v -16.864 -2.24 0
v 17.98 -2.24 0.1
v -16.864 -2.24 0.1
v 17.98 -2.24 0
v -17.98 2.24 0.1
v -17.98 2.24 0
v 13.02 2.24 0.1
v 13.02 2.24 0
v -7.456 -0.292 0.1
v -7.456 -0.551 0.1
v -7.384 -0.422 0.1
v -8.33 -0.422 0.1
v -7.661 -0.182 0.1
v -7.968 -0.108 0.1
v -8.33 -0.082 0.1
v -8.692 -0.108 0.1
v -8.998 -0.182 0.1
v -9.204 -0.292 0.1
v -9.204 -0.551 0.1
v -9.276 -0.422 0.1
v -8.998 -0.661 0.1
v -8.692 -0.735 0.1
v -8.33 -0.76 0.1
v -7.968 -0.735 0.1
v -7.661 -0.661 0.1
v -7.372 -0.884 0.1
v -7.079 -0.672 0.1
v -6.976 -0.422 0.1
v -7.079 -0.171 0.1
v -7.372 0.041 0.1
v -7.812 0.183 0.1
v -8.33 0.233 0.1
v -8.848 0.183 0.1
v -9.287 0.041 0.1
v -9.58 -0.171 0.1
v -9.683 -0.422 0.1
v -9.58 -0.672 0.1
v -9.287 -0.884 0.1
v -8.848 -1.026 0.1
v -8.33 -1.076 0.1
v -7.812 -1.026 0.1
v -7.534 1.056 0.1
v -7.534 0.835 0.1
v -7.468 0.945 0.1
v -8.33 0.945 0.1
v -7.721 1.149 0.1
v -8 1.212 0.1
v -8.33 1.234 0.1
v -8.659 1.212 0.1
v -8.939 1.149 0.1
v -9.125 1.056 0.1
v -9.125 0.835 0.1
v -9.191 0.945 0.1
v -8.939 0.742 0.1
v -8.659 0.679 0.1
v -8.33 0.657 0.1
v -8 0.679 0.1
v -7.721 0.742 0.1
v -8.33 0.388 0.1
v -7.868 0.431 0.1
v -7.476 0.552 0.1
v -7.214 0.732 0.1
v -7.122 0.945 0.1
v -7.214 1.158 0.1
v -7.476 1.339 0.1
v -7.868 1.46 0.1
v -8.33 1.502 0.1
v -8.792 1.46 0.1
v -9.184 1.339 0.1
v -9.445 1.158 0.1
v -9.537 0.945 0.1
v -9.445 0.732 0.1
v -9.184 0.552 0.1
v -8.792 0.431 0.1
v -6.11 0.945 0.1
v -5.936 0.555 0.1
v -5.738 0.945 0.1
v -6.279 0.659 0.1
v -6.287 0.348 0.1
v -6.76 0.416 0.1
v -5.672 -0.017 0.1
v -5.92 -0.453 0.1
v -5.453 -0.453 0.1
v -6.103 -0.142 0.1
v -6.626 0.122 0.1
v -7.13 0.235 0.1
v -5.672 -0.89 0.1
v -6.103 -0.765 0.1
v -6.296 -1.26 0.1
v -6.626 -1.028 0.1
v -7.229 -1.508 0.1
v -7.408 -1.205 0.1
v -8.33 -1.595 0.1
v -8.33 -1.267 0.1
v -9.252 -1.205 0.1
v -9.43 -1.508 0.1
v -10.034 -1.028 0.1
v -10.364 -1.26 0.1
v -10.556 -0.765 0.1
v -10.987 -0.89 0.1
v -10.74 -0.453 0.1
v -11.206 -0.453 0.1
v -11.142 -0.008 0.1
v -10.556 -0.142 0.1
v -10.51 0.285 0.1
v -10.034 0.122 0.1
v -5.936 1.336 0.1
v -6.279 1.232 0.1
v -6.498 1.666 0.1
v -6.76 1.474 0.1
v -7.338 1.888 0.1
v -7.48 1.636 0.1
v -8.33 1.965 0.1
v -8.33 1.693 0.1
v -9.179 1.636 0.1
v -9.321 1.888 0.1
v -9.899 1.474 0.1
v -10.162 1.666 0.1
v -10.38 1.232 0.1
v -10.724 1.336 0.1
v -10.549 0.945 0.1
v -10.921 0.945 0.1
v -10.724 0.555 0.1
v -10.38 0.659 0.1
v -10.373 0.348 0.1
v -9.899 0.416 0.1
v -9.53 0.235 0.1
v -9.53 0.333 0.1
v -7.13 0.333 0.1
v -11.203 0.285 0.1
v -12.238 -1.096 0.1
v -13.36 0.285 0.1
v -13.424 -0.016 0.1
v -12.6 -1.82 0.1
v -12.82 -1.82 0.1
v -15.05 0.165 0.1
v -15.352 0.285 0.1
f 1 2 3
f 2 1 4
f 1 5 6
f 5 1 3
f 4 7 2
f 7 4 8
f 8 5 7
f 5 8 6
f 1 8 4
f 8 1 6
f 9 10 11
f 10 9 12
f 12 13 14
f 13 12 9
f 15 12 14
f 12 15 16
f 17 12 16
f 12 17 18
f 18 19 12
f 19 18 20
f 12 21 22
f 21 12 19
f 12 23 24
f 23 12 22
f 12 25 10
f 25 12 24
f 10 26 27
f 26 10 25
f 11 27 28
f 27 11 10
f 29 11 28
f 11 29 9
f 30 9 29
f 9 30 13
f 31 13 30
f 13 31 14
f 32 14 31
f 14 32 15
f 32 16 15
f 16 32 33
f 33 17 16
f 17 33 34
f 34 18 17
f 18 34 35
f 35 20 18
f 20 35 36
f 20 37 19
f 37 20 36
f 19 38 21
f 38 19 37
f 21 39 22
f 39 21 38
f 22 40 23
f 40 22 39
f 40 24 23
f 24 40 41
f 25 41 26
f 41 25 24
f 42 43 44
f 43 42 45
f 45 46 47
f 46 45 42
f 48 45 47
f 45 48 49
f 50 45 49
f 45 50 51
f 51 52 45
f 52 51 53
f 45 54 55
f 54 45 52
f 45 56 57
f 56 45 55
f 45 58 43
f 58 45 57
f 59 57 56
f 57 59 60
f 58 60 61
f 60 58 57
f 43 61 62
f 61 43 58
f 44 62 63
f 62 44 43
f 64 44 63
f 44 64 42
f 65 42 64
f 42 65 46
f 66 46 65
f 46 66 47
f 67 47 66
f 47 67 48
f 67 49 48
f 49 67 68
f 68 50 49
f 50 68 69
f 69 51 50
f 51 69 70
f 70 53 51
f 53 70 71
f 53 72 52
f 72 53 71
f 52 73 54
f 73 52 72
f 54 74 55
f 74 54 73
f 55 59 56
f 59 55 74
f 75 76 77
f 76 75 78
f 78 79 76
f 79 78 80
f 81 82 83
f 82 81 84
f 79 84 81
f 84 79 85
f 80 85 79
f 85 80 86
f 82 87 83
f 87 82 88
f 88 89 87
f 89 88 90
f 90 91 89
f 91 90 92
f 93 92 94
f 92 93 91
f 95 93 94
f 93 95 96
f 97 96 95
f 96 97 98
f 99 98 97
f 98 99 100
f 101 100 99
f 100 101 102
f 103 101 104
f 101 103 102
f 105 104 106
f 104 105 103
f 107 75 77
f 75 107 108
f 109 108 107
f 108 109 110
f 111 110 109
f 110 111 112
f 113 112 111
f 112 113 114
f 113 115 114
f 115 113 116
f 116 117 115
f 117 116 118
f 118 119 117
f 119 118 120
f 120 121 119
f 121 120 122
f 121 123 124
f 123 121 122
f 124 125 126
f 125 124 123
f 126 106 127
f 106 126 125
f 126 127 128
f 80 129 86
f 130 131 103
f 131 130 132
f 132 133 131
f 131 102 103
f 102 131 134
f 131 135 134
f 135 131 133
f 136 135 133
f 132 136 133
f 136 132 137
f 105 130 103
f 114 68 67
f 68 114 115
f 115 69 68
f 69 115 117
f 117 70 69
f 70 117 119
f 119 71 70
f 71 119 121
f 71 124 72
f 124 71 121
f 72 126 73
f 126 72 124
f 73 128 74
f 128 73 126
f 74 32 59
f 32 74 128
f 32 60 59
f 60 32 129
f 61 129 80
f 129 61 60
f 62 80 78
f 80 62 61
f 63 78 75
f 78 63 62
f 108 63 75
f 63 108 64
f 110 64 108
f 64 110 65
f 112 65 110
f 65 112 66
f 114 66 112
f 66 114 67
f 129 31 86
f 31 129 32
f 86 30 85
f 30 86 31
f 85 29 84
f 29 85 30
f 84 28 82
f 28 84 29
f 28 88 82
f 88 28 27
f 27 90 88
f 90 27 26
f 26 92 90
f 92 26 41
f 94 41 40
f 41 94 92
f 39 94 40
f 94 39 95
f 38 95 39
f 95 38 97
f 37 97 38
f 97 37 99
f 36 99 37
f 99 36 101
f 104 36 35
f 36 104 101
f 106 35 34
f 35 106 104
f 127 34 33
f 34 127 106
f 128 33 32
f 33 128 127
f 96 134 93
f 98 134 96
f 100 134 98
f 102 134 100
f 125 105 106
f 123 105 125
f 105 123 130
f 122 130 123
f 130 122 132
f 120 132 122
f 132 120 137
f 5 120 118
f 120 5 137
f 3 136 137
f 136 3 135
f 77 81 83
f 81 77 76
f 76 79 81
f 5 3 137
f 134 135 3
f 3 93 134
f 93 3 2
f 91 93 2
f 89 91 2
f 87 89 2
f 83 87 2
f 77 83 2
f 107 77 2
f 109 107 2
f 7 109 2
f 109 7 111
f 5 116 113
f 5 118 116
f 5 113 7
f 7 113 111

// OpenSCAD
use <../lib.scad>
function ldraw_lib__4125165f() = [
// 0 Sticker  0.6 x  4.5 Trapezoid with White "v8" on Left Side on Red Background
// 0 Name: 4125165f.dat
// 0 Author: Max Martin Richter [MMR1988]
// 0 !LDRAW_ORG Part UPDATE 2019-03
// 0 !LICENSE Licensed under CC BY 2.0 and CC BY 4.0 : see CAreadme.txt
// 
// 0 BFC CERTIFY CCW
  [0,"BFC","CERTIFY"],
  [0,"BFC","CCW"],
// 
// 0 !KEYWORDS Set 8448
// 
// 0 !HISTORY 2019-12-27 [PTadmin] Official Update 2019-03
// 
// 
// 4 16 44.95 0 -5.6 44.95 -0.25 -5.6 -42.16 -0.25 -5.6 -42.16 0 -5.6
  [4,16,44.95,0,-5.6,44.95,-0.25,-5.6,-42.16,-0.25,-5.6,-42.16,0,-5.6],
// 4 16 -44.95 0 5.6 -42.16 0 -5.6 -42.16 -0.25 -5.6 -44.95 -0.25 5.6
  [4,16,-44.95,0,5.6,-42.16,0,-5.6,-42.16,-0.25,-5.6,-44.95,-0.25,5.6],
// 4 16 44.95 0 -5.6 32.55 0 5.6 32.55 -0.25 5.6 44.95 -0.25 -5.6
  [4,16,44.95,0,-5.6,32.55,0,5.6,32.55,-0.25,5.6,44.95,-0.25,-5.6],
// 4 16 32.55 -0.25 5.6 32.55 0 5.6 -44.95 0 5.6 -44.95 -0.25 5.6
  [4,16,32.55,-0.25,5.6,32.55,0,5.6,-44.95,0,5.6,-44.95,-0.25,5.6],
// 4 16 -42.16 0 -5.6 -44.95 0 5.6 32.55 0 5.6 44.95 0 -5.6
  [4,16,-42.16,0,-5.6,-44.95,0,5.6,32.55,0,5.6,44.95,0,-5.6],
// 
// 4 4 -20.824 -0.25 -1.054 -18.64 -0.25 -1.378 -18.46 -0.25 -1.054 -18.64 -0.25 -0.729
  [4,4,-20.824,-0.25,-1.054,-18.64,-0.25,-1.378,-18.46,-0.25,-1.054,-18.64,-0.25,-0.729],
// 4 4 -20.824 -0.25 -1.054 -18.64 -0.25 -0.729 -19.152 -0.25 -0.454 -19.919 -0.25 -0.271
  [4,4,-20.824,-0.25,-1.054,-18.64,-0.25,-0.729,-19.152,-0.25,-0.454,-19.919,-0.25,-0.271],
// 4 4 -20.824 -0.25 -1.054 -19.919 -0.25 -0.271 -20.824 -0.25 -0.206 -21.729 -0.25 -0.271
  [4,4,-20.824,-0.25,-1.054,-19.919,-0.25,-0.271,-20.824,-0.25,-0.206,-21.729,-0.25,-0.271],
// 4 4 -20.824 -0.25 -1.054 -21.729 -0.25 -0.271 -22.496 -0.25 -0.454 -23.009 -0.25 -0.729
  [4,4,-20.824,-0.25,-1.054,-21.729,-0.25,-0.271,-22.496,-0.25,-0.454,-23.009,-0.25,-0.729],
// 4 4 -20.824 -0.25 -1.054 -23.009 -0.25 -0.729 -23.189 -0.25 -1.054 -23.009 -0.25 -1.378
  [4,4,-20.824,-0.25,-1.054,-23.009,-0.25,-0.729,-23.189,-0.25,-1.054,-23.009,-0.25,-1.378],
// 4 4 -20.824 -0.25 -1.054 -23.009 -0.25 -1.378 -22.496 -0.25 -1.653 -21.729 -0.25 -1.837
  [4,4,-20.824,-0.25,-1.054,-23.009,-0.25,-1.378,-22.496,-0.25,-1.653,-21.729,-0.25,-1.837],
// 4 4 -20.824 -0.25 -1.054 -21.729 -0.25 -1.837 -20.824 -0.25 -1.901 -19.919 -0.25 -1.837
  [4,4,-20.824,-0.25,-1.054,-21.729,-0.25,-1.837,-20.824,-0.25,-1.901,-19.919,-0.25,-1.837],
// 4 4 -20.824 -0.25 -1.054 -19.919 -0.25 -1.837 -19.152 -0.25 -1.653 -18.64 -0.25 -1.378
  [4,4,-20.824,-0.25,-1.054,-19.919,-0.25,-1.837,-19.152,-0.25,-1.653,-18.64,-0.25,-1.378],
// 4 15 -19.152 -0.25 -1.653 -18.431 -0.25 -2.21 -17.698 -0.25 -1.68 -18.64 -0.25 -1.378
  [4,15,-19.152,-0.25,-1.653,-18.431,-0.25,-2.21,-17.698,-0.25,-1.68,-18.64,-0.25,-1.378],
// 4 15 -18.64 -0.25 -1.378 -17.698 -0.25 -1.68 -17.44 -0.25 -1.054 -18.46 -0.25 -1.054
  [4,15,-18.64,-0.25,-1.378,-17.698,-0.25,-1.68,-17.44,-0.25,-1.054,-18.46,-0.25,-1.054],
// 4 15 -18.46 -0.25 -1.054 -17.44 -0.25 -1.054 -17.698 -0.25 -0.428 -18.64 -0.25 -0.729
  [4,15,-18.46,-0.25,-1.054,-17.44,-0.25,-1.054,-17.698,-0.25,-0.428,-18.64,-0.25,-0.729],
// 4 15 -18.64 -0.25 -0.729 -17.698 -0.25 -0.428 -18.431 -0.25 0.103 -19.152 -0.25 -0.454
  [4,15,-18.64,-0.25,-0.729,-17.698,-0.25,-0.428,-18.431,-0.25,0.103,-19.152,-0.25,-0.454],
// 4 15 -19.152 -0.25 -0.454 -18.431 -0.25 0.103 -19.529 -0.25 0.458 -19.919 -0.25 -0.271
  [4,15,-19.152,-0.25,-0.454,-18.431,-0.25,0.103,-19.529,-0.25,0.458,-19.919,-0.25,-0.271],
// 4 15 -19.919 -0.25 -0.271 -19.529 -0.25 0.458 -20.824 -0.25 0.582 -20.824 -0.25 -0.206
  [4,15,-19.919,-0.25,-0.271,-19.529,-0.25,0.458,-20.824,-0.25,0.582,-20.824,-0.25,-0.206],
// 4 15 -20.824 -0.25 -0.206 -20.824 -0.25 0.582 -22.119 -0.25 0.458 -21.729 -0.25 -0.271
  [4,15,-20.824,-0.25,-0.206,-20.824,-0.25,0.582,-22.119,-0.25,0.458,-21.729,-0.25,-0.271],
// 4 15 -21.729 -0.25 -0.271 -22.119 -0.25 0.458 -23.217 -0.25 0.103 -22.496 -0.25 -0.454
  [4,15,-21.729,-0.25,-0.271,-22.119,-0.25,0.458,-23.217,-0.25,0.103,-22.496,-0.25,-0.454],
// 4 15 -22.496 -0.25 -0.454 -23.217 -0.25 0.103 -23.951 -0.25 -0.428 -23.009 -0.25 -0.729
  [4,15,-22.496,-0.25,-0.454,-23.217,-0.25,0.103,-23.951,-0.25,-0.428,-23.009,-0.25,-0.729],
// 4 15 -23.009 -0.25 -0.729 -23.951 -0.25 -0.428 -24.208 -0.25 -1.054 -23.189 -0.25 -1.054
  [4,15,-23.009,-0.25,-0.729,-23.951,-0.25,-0.428,-24.208,-0.25,-1.054,-23.189,-0.25,-1.054],
// 4 15 -23.189 -0.25 -1.054 -24.208 -0.25 -1.054 -23.951 -0.25 -1.68 -23.009 -0.25 -1.378
  [4,15,-23.189,-0.25,-1.054,-24.208,-0.25,-1.054,-23.951,-0.25,-1.68,-23.009,-0.25,-1.378],
// 4 15 -23.009 -0.25 -1.378 -23.951 -0.25 -1.68 -23.217 -0.25 -2.21 -22.496 -0.25 -1.653
  [4,15,-23.009,-0.25,-1.378,-23.951,-0.25,-1.68,-23.217,-0.25,-2.21,-22.496,-0.25,-1.653],
// 4 15 -22.496 -0.25 -1.653 -23.217 -0.25 -2.21 -22.119 -0.25 -2.565 -21.729 -0.25 -1.837
  [4,15,-22.496,-0.25,-1.653,-23.217,-0.25,-2.21,-22.119,-0.25,-2.565,-21.729,-0.25,-1.837],
// 4 15 -21.729 -0.25 -1.837 -22.119 -0.25 -2.565 -20.824 -0.25 -2.689 -20.824 -0.25 -1.901
  [4,15,-21.729,-0.25,-1.837,-22.119,-0.25,-2.565,-20.824,-0.25,-2.689,-20.824,-0.25,-1.901],
// 4 15 -20.824 -0.25 -1.901 -20.824 -0.25 -2.689 -19.529 -0.25 -2.565 -19.919 -0.25 -1.837
  [4,15,-20.824,-0.25,-1.901,-20.824,-0.25,-2.689,-19.529,-0.25,-2.565,-19.919,-0.25,-1.837],
// 4 15 -19.919 -0.25 -1.837 -19.529 -0.25 -2.565 -18.431 -0.25 -2.21 -19.152 -0.25 -1.653
  [4,15,-19.919,-0.25,-1.837,-19.529,-0.25,-2.565,-18.431,-0.25,-2.21,-19.152,-0.25,-1.653],
// 4 4 -20.824 -0.25 2.363 -18.835 -0.25 2.087 -18.671 -0.25 2.363 -18.835 -0.25 2.639
  [4,4,-20.824,-0.25,2.363,-18.835,-0.25,2.087,-18.671,-0.25,2.363,-18.835,-0.25,2.639],
// 4 4 -20.824 -0.25 2.363 -18.835 -0.25 2.639 -19.302 -0.25 2.873 -20 -0.25 3.029
  [4,4,-20.824,-0.25,2.363,-18.835,-0.25,2.639,-19.302,-0.25,2.873,-20,-0.25,3.029],
// 4 4 -20.824 -0.25 2.363 -20 -0.25 3.029 -20.824 -0.25 3.084 -21.648 -0.25 3.029
  [4,4,-20.824,-0.25,2.363,-20,-0.25,3.029,-20.824,-0.25,3.084,-21.648,-0.25,3.029],
// 4 4 -20.824 -0.25 2.363 -21.648 -0.25 3.029 -22.347 -0.25 2.873 -22.813 -0.25 2.639
  [4,4,-20.824,-0.25,2.363,-21.648,-0.25,3.029,-22.347,-0.25,2.873,-22.813,-0.25,2.639],
// 4 4 -20.824 -0.25 2.363 -22.813 -0.25 2.639 -22.977 -0.25 2.363 -22.813 -0.25 2.087
  [4,4,-20.824,-0.25,2.363,-22.813,-0.25,2.639,-22.977,-0.25,2.363,-22.813,-0.25,2.087],
// 4 4 -20.824 -0.25 2.363 -22.813 -0.25 2.087 -22.347 -0.25 1.854 -21.648 -0.25 1.697
  [4,4,-20.824,-0.25,2.363,-22.813,-0.25,2.087,-22.347,-0.25,1.854,-21.648,-0.25,1.697],
// 4 4 -20.824 -0.25 2.363 -21.648 -0.25 1.697 -20.824 -0.25 1.643 -20 -0.25 1.697
  [4,4,-20.824,-0.25,2.363,-21.648,-0.25,1.697,-20.824,-0.25,1.643,-20,-0.25,1.697],
// 4 4 -20.824 -0.25 2.363 -20 -0.25 1.697 -19.302 -0.25 1.854 -18.835 -0.25 2.087
  [4,4,-20.824,-0.25,2.363,-20,-0.25,1.697,-19.302,-0.25,1.854,-18.835,-0.25,2.087],
// 4 15 -20 -0.25 1.697 -20.824 -0.25 1.643 -20.824 -0.25 0.971 -19.669 -0.25 1.077
  [4,15,-20,-0.25,1.697,-20.824,-0.25,1.643,-20.824,-0.25,0.971,-19.669,-0.25,1.077],
// 4 15 -19.302 -0.25 1.854 -20 -0.25 1.697 -19.669 -0.25 1.077 -18.69 -0.25 1.379
  [4,15,-19.302,-0.25,1.854,-20,-0.25,1.697,-19.669,-0.25,1.077,-18.69,-0.25,1.379],
// 4 15 -18.835 -0.25 2.087 -19.302 -0.25 1.854 -18.69 -0.25 1.379 -18.036 -0.25 1.83
  [4,15,-18.835,-0.25,2.087,-19.302,-0.25,1.854,-18.69,-0.25,1.379,-18.036,-0.25,1.83],
// 4 15 -18.671 -0.25 2.363 -18.835 -0.25 2.087 -18.036 -0.25 1.83 -17.806 -0.25 2.363
  [4,15,-18.671,-0.25,2.363,-18.835,-0.25,2.087,-18.036,-0.25,1.83,-17.806,-0.25,2.363],
// 4 15 -18.835 -0.25 2.639 -18.671 -0.25 2.363 -17.806 -0.25 2.363 -18.036 -0.25 2.896
  [4,15,-18.835,-0.25,2.639,-18.671,-0.25,2.363,-17.806,-0.25,2.363,-18.036,-0.25,2.896],
// 4 15 -19.302 -0.25 2.873 -18.835 -0.25 2.639 -18.036 -0.25 2.896 -18.69 -0.25 3.348
  [4,15,-19.302,-0.25,2.873,-18.835,-0.25,2.639,-18.036,-0.25,2.896,-18.69,-0.25,3.348],
// 4 15 -20 -0.25 3.029 -19.302 -0.25 2.873 -18.69 -0.25 3.348 -19.669 -0.25 3.65
  [4,15,-20,-0.25,3.029,-19.302,-0.25,2.873,-18.69,-0.25,3.348,-19.669,-0.25,3.65],
// 4 15 -20.824 -0.25 3.084 -20 -0.25 3.029 -19.669 -0.25 3.65 -20.824 -0.25 3.756
  [4,15,-20.824,-0.25,3.084,-20,-0.25,3.029,-19.669,-0.25,3.65,-20.824,-0.25,3.756],
// 4 15 -21.648 -0.25 3.029 -20.824 -0.25 3.084 -20.824 -0.25 3.756 -21.979 -0.25 3.65
  [4,15,-21.648,-0.25,3.029,-20.824,-0.25,3.084,-20.824,-0.25,3.756,-21.979,-0.25,3.65],
// 4 15 -22.347 -0.25 2.873 -21.648 -0.25 3.029 -21.979 -0.25 3.65 -22.959 -0.25 3.348
  [4,15,-22.347,-0.25,2.873,-21.648,-0.25,3.029,-21.979,-0.25,3.65,-22.959,-0.25,3.348],
// 4 15 -22.813 -0.25 2.639 -22.347 -0.25 2.873 -22.959 -0.25 3.348 -23.613 -0.25 2.896
  [4,15,-22.813,-0.25,2.639,-22.347,-0.25,2.873,-22.959,-0.25,3.348,-23.613,-0.25,2.896],
// 4 15 -22.977 -0.25 2.363 -22.813 -0.25 2.639 -23.613 -0.25 2.896 -23.843 -0.25 2.363
  [4,15,-22.977,-0.25,2.363,-22.813,-0.25,2.639,-23.613,-0.25,2.896,-23.843,-0.25,2.363],
// 4 15 -22.813 -0.25 2.087 -22.977 -0.25 2.363 -23.843 -0.25 2.363 -23.613 -0.25 1.83
  [4,15,-22.813,-0.25,2.087,-22.977,-0.25,2.363,-23.843,-0.25,2.363,-23.613,-0.25,1.83],
// 4 15 -22.347 -0.25 1.854 -22.813 -0.25 2.087 -23.613 -0.25 1.83 -22.959 -0.25 1.379
  [4,15,-22.347,-0.25,1.854,-22.813,-0.25,2.087,-23.613,-0.25,1.83,-22.959,-0.25,1.379],
// 4 15 -21.648 -0.25 1.697 -22.347 -0.25 1.854 -22.959 -0.25 1.379 -21.979 -0.25 1.077
  [4,15,-21.648,-0.25,1.697,-22.347,-0.25,1.854,-22.959,-0.25,1.379,-21.979,-0.25,1.077],
// 4 15 -20.824 -0.25 1.643 -21.648 -0.25 1.697 -21.979 -0.25 1.077 -20.824 -0.25 0.971
  [4,15,-20.824,-0.25,1.643,-21.648,-0.25,1.697,-21.979,-0.25,1.077,-20.824,-0.25,0.971],
// 4 15 -14.84 -0.25 1.387 -14.346 -0.25 2.363 -15.276 -0.25 2.363 -15.698 -0.25 1.648
  [4,15,-14.84,-0.25,1.387,-14.346,-0.25,2.363,-15.276,-0.25,2.363,-15.698,-0.25,1.648],
// 4 15 -15.717 -0.25 0.871 -14.84 -0.25 1.387 -15.698 -0.25 1.648 -16.901 -0.25 1.041
  [4,15,-15.717,-0.25,0.871,-14.84,-0.25,1.387,-15.698,-0.25,1.648,-16.901,-0.25,1.041],
// 4 15 -14.799 -0.25 -1.133 -13.633 -0.25 -1.133 -14.18 -0.25 -0.042 -15.258 -0.25 -0.355
  [4,15,-14.799,-0.25,-1.133,-13.633,-0.25,-1.133,-14.18,-0.25,-0.042,-15.258,-0.25,-0.355],
// 4 15 -15.258 -0.25 -0.355 -14.18 -0.25 -0.042 -15.717 -0.25 0.871 -16.564 -0.25 0.304
  [4,15,-15.258,-0.25,-0.355,-14.18,-0.25,-0.042,-15.717,-0.25,0.871,-16.564,-0.25,0.304],
// 4 15 -16.564 -0.25 0.304 -15.717 -0.25 0.871 -16.901 -0.25 1.041 -17.825 -0.25 0.588
  [4,15,-16.564,-0.25,0.304,-15.717,-0.25,0.871,-16.901,-0.25,1.041,-17.825,-0.25,0.588],
// 4 15 -14.18 -0.25 -2.225 -13.633 -0.25 -1.133 -14.799 -0.25 -1.133 -15.258 -0.25 -1.912
  [4,15,-14.18,-0.25,-2.225,-13.633,-0.25,-1.133,-14.799,-0.25,-1.133,-15.258,-0.25,-1.912],
// 4 15 -15.739 -0.25 -3.151 -14.18 -0.25 -2.225 -15.258 -0.25 -1.912 -16.564 -0.25 -2.571
  [4,15,-15.739,-0.25,-3.151,-14.18,-0.25,-2.225,-15.258,-0.25,-1.912,-16.564,-0.25,-2.571],
// 4 15 -18.072 -0.25 -3.77 -15.739 -0.25 -3.151 -16.564 -0.25 -2.571 -18.519 -0.25 -3.012
  [4,15,-18.072,-0.25,-3.77,-15.739,-0.25,-3.151,-16.564,-0.25,-2.571,-18.519,-0.25,-3.012],
// 4 15 -20.824 -0.25 -3.987 -18.072 -0.25 -3.77 -18.519 -0.25 -3.012 -20.824 -0.25 -3.167
  [4,15,-20.824,-0.25,-3.987,-18.072,-0.25,-3.77,-18.519,-0.25,-3.012,-20.824,-0.25,-3.167],
// 4 15 -23.576 -0.25 -3.77 -20.824 -0.25 -3.987 -20.824 -0.25 -3.167 -23.13 -0.25 -3.012
  [4,15,-23.576,-0.25,-3.77,-20.824,-0.25,-3.987,-20.824,-0.25,-3.167,-23.13,-0.25,-3.012],
// 4 15 -25.909 -0.25 -3.151 -23.576 -0.25 -3.77 -23.13 -0.25 -3.012 -25.085 -0.25 -2.571
  [4,15,-25.909,-0.25,-3.151,-23.576,-0.25,-3.77,-23.13,-0.25,-3.012,-25.085,-0.25,-2.571],
// 4 15 -27.468 -0.25 -2.225 -25.909 -0.25 -3.151 -25.085 -0.25 -2.571 -26.391 -0.25 -1.912
  [4,15,-27.468,-0.25,-2.225,-25.909,-0.25,-3.151,-25.085,-0.25,-2.571,-26.391,-0.25,-1.912],
// 4 15 -28.016 -0.25 -1.133 -27.468 -0.25 -2.225 -26.391 -0.25 -1.912 -26.849 -0.25 -1.133
  [4,15,-28.016,-0.25,-1.133,-27.468,-0.25,-2.225,-26.391,-0.25,-1.912,-26.849,-0.25,-1.133],
// 4 15 -27.856 -0.25 -0.02 -28.016 -0.25 -1.133 -26.849 -0.25 -1.133 -26.391 -0.25 -0.355
  [4,15,-27.856,-0.25,-0.02,-28.016,-0.25,-1.133,-26.849,-0.25,-1.133,-26.391,-0.25,-0.355],
// 4 15 -27.856 -0.25 -0.02 -26.391 -0.25 -0.355 -25.085 -0.25 0.304 -26.274 -0.25 0.712
  [4,15,-27.856,-0.25,-0.02,-26.391,-0.25,-0.355,-25.085,-0.25,0.304,-26.274,-0.25,0.712],
// 4 15 -15.276 -0.25 2.363 -14.346 -0.25 2.363 -14.84 -0.25 3.339 -15.698 -0.25 3.079
  [4,15,-15.276,-0.25,2.363,-14.346,-0.25,2.363,-14.84,-0.25,3.339,-15.698,-0.25,3.079],
// 4 15 -15.698 -0.25 3.079 -14.84 -0.25 3.339 -16.244 -0.25 4.166 -16.901 -0.25 3.685
  [4,15,-15.698,-0.25,3.079,-14.84,-0.25,3.339,-16.244,-0.25,4.166,-16.901,-0.25,3.685],
// 4 15 -16.901 -0.25 3.685 -16.244 -0.25 4.166 -18.345 -0.25 4.719 -18.701 -0.25 4.091
  [4,15,-16.901,-0.25,3.685,-16.244,-0.25,4.166,-18.345,-0.25,4.719,-18.701,-0.25,4.091],
// 4 15 -18.701 -0.25 4.091 -18.345 -0.25 4.719 -20.824 -0.25 4.913 -20.824 -0.25 4.233
  [4,15,-18.701,-0.25,4.091,-18.345,-0.25,4.719,-20.824,-0.25,4.913,-20.824,-0.25,4.233],
// 4 15 -20.824 -0.25 4.233 -20.824 -0.25 4.913 -23.303 -0.25 4.719 -22.948 -0.25 4.091
  [4,15,-20.824,-0.25,4.233,-20.824,-0.25,4.913,-23.303,-0.25,4.719,-22.948,-0.25,4.091],
// 4 15 -22.948 -0.25 4.091 -23.303 -0.25 4.719 -25.405 -0.25 4.166 -24.748 -0.25 3.685
  [4,15,-22.948,-0.25,4.091,-23.303,-0.25,4.719,-25.405,-0.25,4.166,-24.748,-0.25,3.685],
// 4 15 -24.748 -0.25 3.685 -25.405 -0.25 4.166 -26.809 -0.25 3.339 -25.95 -0.25 3.079
  [4,15,-24.748,-0.25,3.685,-25.405,-0.25,4.166,-26.809,-0.25,3.339,-25.95,-0.25,3.079],
// 4 15 -25.95 -0.25 3.079 -26.809 -0.25 3.339 -27.302 -0.25 2.363 -26.373 -0.25 2.363
  [4,15,-25.95,-0.25,3.079,-26.809,-0.25,3.339,-27.302,-0.25,2.363,-26.373,-0.25,2.363],
// 4 15 -26.373 -0.25 2.363 -27.302 -0.25 2.363 -26.809 -0.25 1.387 -25.95 -0.25 1.648
  [4,15,-26.373,-0.25,2.363,-27.302,-0.25,2.363,-26.809,-0.25,1.387,-25.95,-0.25,1.648],
// 4 15 -25.95 -0.25 1.648 -26.809 -0.25 1.387 -25.932 -0.25 0.871 -24.748 -0.25 1.041
  [4,15,-25.95,-0.25,1.648,-26.809,-0.25,1.387,-25.932,-0.25,0.871,-24.748,-0.25,1.041],
// 4 15 -24.748 -0.25 1.041 -25.932 -0.25 0.871 -25.085 -0.25 0.304 -23.824 -0.25 0.588
  [4,15,-24.748,-0.25,1.041,-25.932,-0.25,0.871,-25.085,-0.25,0.304,-23.824,-0.25,0.588],
// 3 15 -24.748 -0.25 1.041 -23.824 -0.25 0.588 -23.824 -0.25 0.833
  [3,15,-24.748,-0.25,1.041,-23.824,-0.25,0.588,-23.824,-0.25,0.833],
// 3 15 -16.901 -0.25 1.041 -17.825 -0.25 0.833 -17.825 -0.25 0.588
  [3,15,-16.901,-0.25,1.041,-17.825,-0.25,0.833,-17.825,-0.25,0.588],
// 4 4 -30.595 -0.25 -2.739 -27.856 -0.25 -0.02 -28.008 -0.25 0.712 -33.399 -0.25 0.712
  [4,4,-30.595,-0.25,-2.739,-27.856,-0.25,-0.02,-28.008,-0.25,0.712,-33.399,-0.25,0.712],
// 3 4 -33.399 -0.25 0.712 -33.559 -0.25 -0.039 -30.595 -0.25 -2.739
  [3,4,-33.399,-0.25,0.712,-33.559,-0.25,-0.039,-30.595,-0.25,-2.739],
// 4 15 -28.016 -0.25 -1.133 -27.856 -0.25 -0.02 -30.595 -0.25 -2.739 -31.501 -0.25 -4.55
  [4,15,-28.016,-0.25,-1.133,-27.856,-0.25,-0.02,-30.595,-0.25,-2.739,-31.501,-0.25,-4.55],
// 4 15 -32.051 -0.25 -4.55 -31.501 -0.25 -4.55 -30.595 -0.25 -2.739 -33.559 -0.25 -0.039
  [4,15,-32.051,-0.25,-4.55,-31.501,-0.25,-4.55,-30.595,-0.25,-2.739,-33.559,-0.25,-0.039],
// 3 15 -37.626 -0.25 0.413 -32.051 -0.25 -4.55 -33.559 -0.25 -0.039
  [3,15,-37.626,-0.25,0.413,-32.051,-0.25,-4.55,-33.559,-0.25,-0.039],
// 4 15 -38.38 -0.25 0.712 -37.626 -0.25 0.413 -33.559 -0.25 -0.039 -33.399 -0.25 0.712
  [4,15,-38.38,-0.25,0.712,-37.626,-0.25,0.413,-33.559,-0.25,-0.039,-33.399,-0.25,0.712],
// 3 15 -26.274 -0.25 0.712 -28.008 -0.25 0.712 -27.856 -0.25 -0.02
  [3,15,-26.274,-0.25,0.712,-28.008,-0.25,0.712,-27.856,-0.25,-0.02],
// 4 4 -21.979 -0.25 3.65 -20.824 -0.25 3.756 -20.824 -0.25 4.233 -22.948 -0.25 4.091
  [4,4,-21.979,-0.25,3.65,-20.824,-0.25,3.756,-20.824,-0.25,4.233,-22.948,-0.25,4.091],
// 4 4 -22.959 -0.25 3.348 -21.979 -0.25 3.65 -22.948 -0.25 4.091 -24.748 -0.25 3.685
  [4,4,-22.959,-0.25,3.348,-21.979,-0.25,3.65,-22.948,-0.25,4.091,-24.748,-0.25,3.685],
// 4 4 -23.613 -0.25 2.896 -22.959 -0.25 3.348 -24.748 -0.25 3.685 -25.95 -0.25 3.079
  [4,4,-23.613,-0.25,2.896,-22.959,-0.25,3.348,-24.748,-0.25,3.685,-25.95,-0.25,3.079],
// 4 4 -23.843 -0.25 2.363 -23.613 -0.25 2.896 -25.95 -0.25 3.079 -26.373 -0.25 2.363
  [4,4,-23.843,-0.25,2.363,-23.613,-0.25,2.896,-25.95,-0.25,3.079,-26.373,-0.25,2.363],
// 4 4 -23.613 -0.25 1.83 -23.843 -0.25 2.363 -26.373 -0.25 2.363 -25.95 -0.25 1.648
  [4,4,-23.613,-0.25,1.83,-23.843,-0.25,2.363,-26.373,-0.25,2.363,-25.95,-0.25,1.648],
// 4 4 -22.959 -0.25 1.379 -23.613 -0.25 1.83 -25.95 -0.25 1.648 -24.748 -0.25 1.041
  [4,4,-22.959,-0.25,1.379,-23.613,-0.25,1.83,-25.95,-0.25,1.648,-24.748,-0.25,1.041],
// 4 4 -21.979 -0.25 1.077 -22.959 -0.25 1.379 -24.748 -0.25 1.041 -23.824 -0.25 0.833
  [4,4,-21.979,-0.25,1.077,-22.959,-0.25,1.379,-24.748,-0.25,1.041,-23.824,-0.25,0.833],
// 4 4 -20.824 -0.25 0.971 -21.979 -0.25 1.077 -23.824 -0.25 0.833 -20.824 -0.25 0.582
  [4,4,-20.824,-0.25,0.971,-21.979,-0.25,1.077,-23.824,-0.25,0.833,-20.824,-0.25,0.582],
// 4 4 -20.824 -0.25 0.971 -20.824 -0.25 0.582 -17.825 -0.25 0.833 -19.669 -0.25 1.077
  [4,4,-20.824,-0.25,0.971,-20.824,-0.25,0.582,-17.825,-0.25,0.833,-19.669,-0.25,1.077],
// 4 4 -19.669 -0.25 1.077 -17.825 -0.25 0.833 -16.901 -0.25 1.041 -18.69 -0.25 1.379
  [4,4,-19.669,-0.25,1.077,-17.825,-0.25,0.833,-16.901,-0.25,1.041,-18.69,-0.25,1.379],
// 4 4 -18.69 -0.25 1.379 -16.901 -0.25 1.041 -15.698 -0.25 1.648 -18.036 -0.25 1.83
  [4,4,-18.69,-0.25,1.379,-16.901,-0.25,1.041,-15.698,-0.25,1.648,-18.036,-0.25,1.83],
// 4 4 -18.036 -0.25 1.83 -15.698 -0.25 1.648 -15.276 -0.25 2.363 -17.806 -0.25 2.363
  [4,4,-18.036,-0.25,1.83,-15.698,-0.25,1.648,-15.276,-0.25,2.363,-17.806,-0.25,2.363],
// 4 4 -17.806 -0.25 2.363 -15.276 -0.25 2.363 -15.698 -0.25 3.079 -18.036 -0.25 2.896
  [4,4,-17.806,-0.25,2.363,-15.276,-0.25,2.363,-15.698,-0.25,3.079,-18.036,-0.25,2.896],
// 4 4 -18.036 -0.25 2.896 -15.698 -0.25 3.079 -16.901 -0.25 3.685 -18.69 -0.25 3.348
  [4,4,-18.036,-0.25,2.896,-15.698,-0.25,3.079,-16.901,-0.25,3.685,-18.69,-0.25,3.348],
// 4 4 -18.69 -0.25 3.348 -16.901 -0.25 3.685 -18.701 -0.25 4.091 -19.669 -0.25 3.65
  [4,4,-18.69,-0.25,3.348,-16.901,-0.25,3.685,-18.701,-0.25,4.091,-19.669,-0.25,3.65],
// 4 4 -19.669 -0.25 3.65 -18.701 -0.25 4.091 -20.824 -0.25 4.233 -20.824 -0.25 3.756
  [4,4,-19.669,-0.25,3.65,-18.701,-0.25,4.091,-20.824,-0.25,4.233,-20.824,-0.25,3.756],
// 4 4 -17.825 -0.25 0.833 -20.824 -0.25 0.582 -19.529 -0.25 0.458 -17.825 -0.25 0.588
  [4,4,-17.825,-0.25,0.833,-20.824,-0.25,0.582,-19.529,-0.25,0.458,-17.825,-0.25,0.588],
// 4 4 -17.825 -0.25 0.588 -19.529 -0.25 0.458 -18.431 -0.25 0.103 -16.564 -0.25 0.304
  [4,4,-17.825,-0.25,0.588,-19.529,-0.25,0.458,-18.431,-0.25,0.103,-16.564,-0.25,0.304],
// 4 4 -16.564 -0.25 0.304 -18.431 -0.25 0.103 -17.698 -0.25 -0.428 -15.258 -0.25 -0.355
  [4,4,-16.564,-0.25,0.304,-18.431,-0.25,0.103,-17.698,-0.25,-0.428,-15.258,-0.25,-0.355],
// 4 4 -15.258 -0.25 -0.355 -17.698 -0.25 -0.428 -17.44 -0.25 -1.054 -14.799 -0.25 -1.133
  [4,4,-15.258,-0.25,-0.355,-17.698,-0.25,-0.428,-17.44,-0.25,-1.054,-14.799,-0.25,-1.133],
// 4 4 -14.799 -0.25 -1.133 -17.44 -0.25 -1.054 -17.698 -0.25 -1.68 -15.258 -0.25 -1.912
  [4,4,-14.799,-0.25,-1.133,-17.44,-0.25,-1.054,-17.698,-0.25,-1.68,-15.258,-0.25,-1.912],
// 4 4 -15.258 -0.25 -1.912 -17.698 -0.25 -1.68 -18.431 -0.25 -2.21 -16.564 -0.25 -2.571
  [4,4,-15.258,-0.25,-1.912,-17.698,-0.25,-1.68,-18.431,-0.25,-2.21,-16.564,-0.25,-2.571],
// 4 4 -16.564 -0.25 -2.571 -18.431 -0.25 -2.21 -19.529 -0.25 -2.565 -18.519 -0.25 -3.012
  [4,4,-16.564,-0.25,-2.571,-18.431,-0.25,-2.21,-19.529,-0.25,-2.565,-18.519,-0.25,-3.012],
// 4 4 -18.519 -0.25 -3.012 -19.529 -0.25 -2.565 -20.824 -0.25 -2.689 -20.824 -0.25 -3.167
  [4,4,-18.519,-0.25,-3.012,-19.529,-0.25,-2.565,-20.824,-0.25,-2.689,-20.824,-0.25,-3.167],
// 4 4 -23.13 -0.25 -3.012 -20.824 -0.25 -3.167 -20.824 -0.25 -2.689 -22.119 -0.25 -2.565
  [4,4,-23.13,-0.25,-3.012,-20.824,-0.25,-3.167,-20.824,-0.25,-2.689,-22.119,-0.25,-2.565],
// 4 4 -25.085 -0.25 -2.571 -23.13 -0.25 -3.012 -22.119 -0.25 -2.565 -23.217 -0.25 -2.21
  [4,4,-25.085,-0.25,-2.571,-23.13,-0.25,-3.012,-22.119,-0.25,-2.565,-23.217,-0.25,-2.21],
// 4 4 -26.391 -0.25 -1.912 -25.085 -0.25 -2.571 -23.217 -0.25 -2.21 -23.951 -0.25 -1.68
  [4,4,-26.391,-0.25,-1.912,-25.085,-0.25,-2.571,-23.217,-0.25,-2.21,-23.951,-0.25,-1.68],
// 4 4 -26.849 -0.25 -1.133 -26.391 -0.25 -1.912 -23.951 -0.25 -1.68 -24.208 -0.25 -1.054
  [4,4,-26.849,-0.25,-1.133,-26.391,-0.25,-1.912,-23.951,-0.25,-1.68,-24.208,-0.25,-1.054],
// 4 4 -26.391 -0.25 -0.355 -26.849 -0.25 -1.133 -24.208 -0.25 -1.054 -23.951 -0.25 -0.428
  [4,4,-26.391,-0.25,-0.355,-26.849,-0.25,-1.133,-24.208,-0.25,-1.054,-23.951,-0.25,-0.428],
// 4 4 -25.085 -0.25 0.304 -26.391 -0.25 -0.355 -23.951 -0.25 -0.428 -23.217 -0.25 0.103
  [4,4,-25.085,-0.25,0.304,-26.391,-0.25,-0.355,-23.951,-0.25,-0.428,-23.217,-0.25,0.103],
// 4 4 -23.824 -0.25 0.588 -25.085 -0.25 0.304 -23.217 -0.25 0.103 -22.119 -0.25 0.458
  [4,4,-23.824,-0.25,0.588,-25.085,-0.25,0.304,-23.217,-0.25,0.103,-22.119,-0.25,0.458],
// 4 4 -23.824 -0.25 0.833 -23.824 -0.25 0.588 -22.119 -0.25 0.458 -20.824 -0.25 0.582
  [4,4,-23.824,-0.25,0.833,-23.824,-0.25,0.588,-22.119,-0.25,0.458,-20.824,-0.25,0.582],
// 3 4 -23.576 -0.25 -3.77 -31.501 -0.25 -4.55 -20.824 -0.25 -3.987
  [3,4,-23.576,-0.25,-3.77,-31.501,-0.25,-4.55,-20.824,-0.25,-3.987],
// 3 4 -25.909 -0.25 -3.151 -31.501 -0.25 -4.55 -23.576 -0.25 -3.77
  [3,4,-25.909,-0.25,-3.151,-31.501,-0.25,-4.55,-23.576,-0.25,-3.77],
// 3 4 -27.468 -0.25 -2.225 -31.501 -0.25 -4.55 -25.909 -0.25 -3.151
  [3,4,-27.468,-0.25,-2.225,-31.501,-0.25,-4.55,-25.909,-0.25,-3.151],
// 3 4 -28.016 -0.25 -1.133 -31.501 -0.25 -4.55 -27.468 -0.25 -2.225
  [3,4,-28.016,-0.25,-1.133,-31.501,-0.25,-4.55,-27.468,-0.25,-2.225],
// 3 15 -25.932 -0.25 0.871 -26.274 -0.25 0.712 -25.085 -0.25 0.304
  [3,15,-25.932,-0.25,0.871,-26.274,-0.25,0.712,-25.085,-0.25,0.304],
// 4 4 -26.274 -0.25 0.712 -25.932 -0.25 0.871 -26.809 -0.25 1.387 -28.008 -0.25 0.712
  [4,4,-26.274,-0.25,0.712,-25.932,-0.25,0.871,-26.809,-0.25,1.387,-28.008,-0.25,0.712],
// 4 4 -28.008 -0.25 0.712 -26.809 -0.25 1.387 -27.302 -0.25 2.363 -33.399 -0.25 0.712
  [4,4,-28.008,-0.25,0.712,-26.809,-0.25,1.387,-27.302,-0.25,2.363,-33.399,-0.25,0.712],
// 4 4 -33.399 -0.25 0.712 -27.302 -0.25 2.363 -26.809 -0.25 3.339 -38.38 -0.25 0.712
  [4,4,-33.399,-0.25,0.712,-27.302,-0.25,2.363,-26.809,-0.25,3.339,-38.38,-0.25,0.712],
// 4 4 -38.38 -0.25 0.712 -26.809 -0.25 3.339 -25.405 -0.25 4.166 -44.95 -0.25 5.6
  [4,4,-38.38,-0.25,0.712,-26.809,-0.25,3.339,-25.405,-0.25,4.166,-44.95,-0.25,5.6],
// 4 4 -32.051 -0.25 -4.55 -37.626 -0.25 0.413 -38.38 -0.25 0.712 -42.16 -0.25 -5.6
  [4,4,-32.051,-0.25,-4.55,-37.626,-0.25,0.413,-38.38,-0.25,0.712,-42.16,-0.25,-5.6],
// 4 4 -14.18 -0.25 -0.042 -13.633 -0.25 -1.133 -14.346 -0.25 2.363 -14.84 -0.25 1.387
  [4,4,-14.18,-0.25,-0.042,-13.633,-0.25,-1.133,-14.346,-0.25,2.363,-14.84,-0.25,1.387],
// 3 4 -14.84 -0.25 1.387 -15.717 -0.25 0.871 -14.18 -0.25 -0.042
  [3,4,-14.84,-0.25,1.387,-15.717,-0.25,0.871,-14.18,-0.25,-0.042],
// 3 4 -44.95 -0.25 5.6 -42.16 -0.25 -5.6 -38.38 -0.25 0.712
  [3,4,-44.95,-0.25,5.6,-42.16,-0.25,-5.6,-38.38,-0.25,0.712],
// 3 4 -31.501 -0.25 -4.55 -32.051 -0.25 -4.55 -42.16 -0.25 -5.6
  [3,4,-31.501,-0.25,-4.55,-32.051,-0.25,-4.55,-42.16,-0.25,-5.6],
// 4 4 -20.824 -0.25 -3.987 -31.501 -0.25 -4.55 -42.16 -0.25 -5.6 44.95 -0.25 -5.6
  [4,4,-20.824,-0.25,-3.987,-31.501,-0.25,-4.55,-42.16,-0.25,-5.6,44.95,-0.25,-5.6],
// 3 4 -18.072 -0.25 -3.77 -20.824 -0.25 -3.987 44.95 -0.25 -5.6
  [3,4,-18.072,-0.25,-3.77,-20.824,-0.25,-3.987,44.95,-0.25,-5.6],
// 3 4 -15.739 -0.25 -3.151 -18.072 -0.25 -3.77 44.95 -0.25 -5.6
  [3,4,-15.739,-0.25,-3.151,-18.072,-0.25,-3.77,44.95,-0.25,-5.6],
// 3 4 -14.18 -0.25 -2.225 -15.739 -0.25 -3.151 44.95 -0.25 -5.6
  [3,4,-14.18,-0.25,-2.225,-15.739,-0.25,-3.151,44.95,-0.25,-5.6],
// 3 4 -13.633 -0.25 -1.133 -14.18 -0.25 -2.225 44.95 -0.25 -5.6
  [3,4,-13.633,-0.25,-1.133,-14.18,-0.25,-2.225,44.95,-0.25,-5.6],
// 3 4 -14.346 -0.25 2.363 -13.633 -0.25 -1.133 44.95 -0.25 -5.6
  [3,4,-14.346,-0.25,2.363,-13.633,-0.25,-1.133,44.95,-0.25,-5.6],
// 3 4 -14.84 -0.25 3.339 -14.346 -0.25 2.363 44.95 -0.25 -5.6
  [3,4,-14.84,-0.25,3.339,-14.346,-0.25,2.363,44.95,-0.25,-5.6],
// 3 4 -16.244 -0.25 4.166 -14.84 -0.25 3.339 44.95 -0.25 -5.6
  [3,4,-16.244,-0.25,4.166,-14.84,-0.25,3.339,44.95,-0.25,-5.6],
// 4 4 -18.345 -0.25 4.719 -16.244 -0.25 4.166 44.95 -0.25 -5.6 32.55 -0.25 5.6
  [4,4,-18.345,-0.25,4.719,-16.244,-0.25,4.166,44.95,-0.25,-5.6,32.55,-0.25,5.6],
// 3 4 -44.95 -0.25 5.6 -23.303 -0.25 4.719 -20.824 -0.25 4.913
  [3,4,-44.95,-0.25,5.6,-23.303,-0.25,4.719,-20.824,-0.25,4.913],
// 3 4 -44.95 -0.25 5.6 -25.405 -0.25 4.166 -23.303 -0.25 4.719
  [3,4,-44.95,-0.25,5.6,-25.405,-0.25,4.166,-23.303,-0.25,4.719],
// 3 4 -44.95 -0.25 5.6 -20.824 -0.25 4.913 32.55 -0.25 5.6
  [3,4,-44.95,-0.25,5.6,-20.824,-0.25,4.913,32.55,-0.25,5.6],
// 3 4 32.55 -0.25 5.6 -20.824 -0.25 4.913 -18.345 -0.25 4.719
  [3,4,32.55,-0.25,5.6,-20.824,-0.25,4.913,-18.345,-0.25,4.719],
];
module ldraw_lib__4125165f(step=0, col=false, unit=2/5, alt=false, line=0.2, solid=!$preview)
    makepoly(ldraw_lib__4125165f(), step=step, col=col, unit=unit, alt=alt, line=line, solid=solid);
ldraw_lib__4125165f(line=0.2);
